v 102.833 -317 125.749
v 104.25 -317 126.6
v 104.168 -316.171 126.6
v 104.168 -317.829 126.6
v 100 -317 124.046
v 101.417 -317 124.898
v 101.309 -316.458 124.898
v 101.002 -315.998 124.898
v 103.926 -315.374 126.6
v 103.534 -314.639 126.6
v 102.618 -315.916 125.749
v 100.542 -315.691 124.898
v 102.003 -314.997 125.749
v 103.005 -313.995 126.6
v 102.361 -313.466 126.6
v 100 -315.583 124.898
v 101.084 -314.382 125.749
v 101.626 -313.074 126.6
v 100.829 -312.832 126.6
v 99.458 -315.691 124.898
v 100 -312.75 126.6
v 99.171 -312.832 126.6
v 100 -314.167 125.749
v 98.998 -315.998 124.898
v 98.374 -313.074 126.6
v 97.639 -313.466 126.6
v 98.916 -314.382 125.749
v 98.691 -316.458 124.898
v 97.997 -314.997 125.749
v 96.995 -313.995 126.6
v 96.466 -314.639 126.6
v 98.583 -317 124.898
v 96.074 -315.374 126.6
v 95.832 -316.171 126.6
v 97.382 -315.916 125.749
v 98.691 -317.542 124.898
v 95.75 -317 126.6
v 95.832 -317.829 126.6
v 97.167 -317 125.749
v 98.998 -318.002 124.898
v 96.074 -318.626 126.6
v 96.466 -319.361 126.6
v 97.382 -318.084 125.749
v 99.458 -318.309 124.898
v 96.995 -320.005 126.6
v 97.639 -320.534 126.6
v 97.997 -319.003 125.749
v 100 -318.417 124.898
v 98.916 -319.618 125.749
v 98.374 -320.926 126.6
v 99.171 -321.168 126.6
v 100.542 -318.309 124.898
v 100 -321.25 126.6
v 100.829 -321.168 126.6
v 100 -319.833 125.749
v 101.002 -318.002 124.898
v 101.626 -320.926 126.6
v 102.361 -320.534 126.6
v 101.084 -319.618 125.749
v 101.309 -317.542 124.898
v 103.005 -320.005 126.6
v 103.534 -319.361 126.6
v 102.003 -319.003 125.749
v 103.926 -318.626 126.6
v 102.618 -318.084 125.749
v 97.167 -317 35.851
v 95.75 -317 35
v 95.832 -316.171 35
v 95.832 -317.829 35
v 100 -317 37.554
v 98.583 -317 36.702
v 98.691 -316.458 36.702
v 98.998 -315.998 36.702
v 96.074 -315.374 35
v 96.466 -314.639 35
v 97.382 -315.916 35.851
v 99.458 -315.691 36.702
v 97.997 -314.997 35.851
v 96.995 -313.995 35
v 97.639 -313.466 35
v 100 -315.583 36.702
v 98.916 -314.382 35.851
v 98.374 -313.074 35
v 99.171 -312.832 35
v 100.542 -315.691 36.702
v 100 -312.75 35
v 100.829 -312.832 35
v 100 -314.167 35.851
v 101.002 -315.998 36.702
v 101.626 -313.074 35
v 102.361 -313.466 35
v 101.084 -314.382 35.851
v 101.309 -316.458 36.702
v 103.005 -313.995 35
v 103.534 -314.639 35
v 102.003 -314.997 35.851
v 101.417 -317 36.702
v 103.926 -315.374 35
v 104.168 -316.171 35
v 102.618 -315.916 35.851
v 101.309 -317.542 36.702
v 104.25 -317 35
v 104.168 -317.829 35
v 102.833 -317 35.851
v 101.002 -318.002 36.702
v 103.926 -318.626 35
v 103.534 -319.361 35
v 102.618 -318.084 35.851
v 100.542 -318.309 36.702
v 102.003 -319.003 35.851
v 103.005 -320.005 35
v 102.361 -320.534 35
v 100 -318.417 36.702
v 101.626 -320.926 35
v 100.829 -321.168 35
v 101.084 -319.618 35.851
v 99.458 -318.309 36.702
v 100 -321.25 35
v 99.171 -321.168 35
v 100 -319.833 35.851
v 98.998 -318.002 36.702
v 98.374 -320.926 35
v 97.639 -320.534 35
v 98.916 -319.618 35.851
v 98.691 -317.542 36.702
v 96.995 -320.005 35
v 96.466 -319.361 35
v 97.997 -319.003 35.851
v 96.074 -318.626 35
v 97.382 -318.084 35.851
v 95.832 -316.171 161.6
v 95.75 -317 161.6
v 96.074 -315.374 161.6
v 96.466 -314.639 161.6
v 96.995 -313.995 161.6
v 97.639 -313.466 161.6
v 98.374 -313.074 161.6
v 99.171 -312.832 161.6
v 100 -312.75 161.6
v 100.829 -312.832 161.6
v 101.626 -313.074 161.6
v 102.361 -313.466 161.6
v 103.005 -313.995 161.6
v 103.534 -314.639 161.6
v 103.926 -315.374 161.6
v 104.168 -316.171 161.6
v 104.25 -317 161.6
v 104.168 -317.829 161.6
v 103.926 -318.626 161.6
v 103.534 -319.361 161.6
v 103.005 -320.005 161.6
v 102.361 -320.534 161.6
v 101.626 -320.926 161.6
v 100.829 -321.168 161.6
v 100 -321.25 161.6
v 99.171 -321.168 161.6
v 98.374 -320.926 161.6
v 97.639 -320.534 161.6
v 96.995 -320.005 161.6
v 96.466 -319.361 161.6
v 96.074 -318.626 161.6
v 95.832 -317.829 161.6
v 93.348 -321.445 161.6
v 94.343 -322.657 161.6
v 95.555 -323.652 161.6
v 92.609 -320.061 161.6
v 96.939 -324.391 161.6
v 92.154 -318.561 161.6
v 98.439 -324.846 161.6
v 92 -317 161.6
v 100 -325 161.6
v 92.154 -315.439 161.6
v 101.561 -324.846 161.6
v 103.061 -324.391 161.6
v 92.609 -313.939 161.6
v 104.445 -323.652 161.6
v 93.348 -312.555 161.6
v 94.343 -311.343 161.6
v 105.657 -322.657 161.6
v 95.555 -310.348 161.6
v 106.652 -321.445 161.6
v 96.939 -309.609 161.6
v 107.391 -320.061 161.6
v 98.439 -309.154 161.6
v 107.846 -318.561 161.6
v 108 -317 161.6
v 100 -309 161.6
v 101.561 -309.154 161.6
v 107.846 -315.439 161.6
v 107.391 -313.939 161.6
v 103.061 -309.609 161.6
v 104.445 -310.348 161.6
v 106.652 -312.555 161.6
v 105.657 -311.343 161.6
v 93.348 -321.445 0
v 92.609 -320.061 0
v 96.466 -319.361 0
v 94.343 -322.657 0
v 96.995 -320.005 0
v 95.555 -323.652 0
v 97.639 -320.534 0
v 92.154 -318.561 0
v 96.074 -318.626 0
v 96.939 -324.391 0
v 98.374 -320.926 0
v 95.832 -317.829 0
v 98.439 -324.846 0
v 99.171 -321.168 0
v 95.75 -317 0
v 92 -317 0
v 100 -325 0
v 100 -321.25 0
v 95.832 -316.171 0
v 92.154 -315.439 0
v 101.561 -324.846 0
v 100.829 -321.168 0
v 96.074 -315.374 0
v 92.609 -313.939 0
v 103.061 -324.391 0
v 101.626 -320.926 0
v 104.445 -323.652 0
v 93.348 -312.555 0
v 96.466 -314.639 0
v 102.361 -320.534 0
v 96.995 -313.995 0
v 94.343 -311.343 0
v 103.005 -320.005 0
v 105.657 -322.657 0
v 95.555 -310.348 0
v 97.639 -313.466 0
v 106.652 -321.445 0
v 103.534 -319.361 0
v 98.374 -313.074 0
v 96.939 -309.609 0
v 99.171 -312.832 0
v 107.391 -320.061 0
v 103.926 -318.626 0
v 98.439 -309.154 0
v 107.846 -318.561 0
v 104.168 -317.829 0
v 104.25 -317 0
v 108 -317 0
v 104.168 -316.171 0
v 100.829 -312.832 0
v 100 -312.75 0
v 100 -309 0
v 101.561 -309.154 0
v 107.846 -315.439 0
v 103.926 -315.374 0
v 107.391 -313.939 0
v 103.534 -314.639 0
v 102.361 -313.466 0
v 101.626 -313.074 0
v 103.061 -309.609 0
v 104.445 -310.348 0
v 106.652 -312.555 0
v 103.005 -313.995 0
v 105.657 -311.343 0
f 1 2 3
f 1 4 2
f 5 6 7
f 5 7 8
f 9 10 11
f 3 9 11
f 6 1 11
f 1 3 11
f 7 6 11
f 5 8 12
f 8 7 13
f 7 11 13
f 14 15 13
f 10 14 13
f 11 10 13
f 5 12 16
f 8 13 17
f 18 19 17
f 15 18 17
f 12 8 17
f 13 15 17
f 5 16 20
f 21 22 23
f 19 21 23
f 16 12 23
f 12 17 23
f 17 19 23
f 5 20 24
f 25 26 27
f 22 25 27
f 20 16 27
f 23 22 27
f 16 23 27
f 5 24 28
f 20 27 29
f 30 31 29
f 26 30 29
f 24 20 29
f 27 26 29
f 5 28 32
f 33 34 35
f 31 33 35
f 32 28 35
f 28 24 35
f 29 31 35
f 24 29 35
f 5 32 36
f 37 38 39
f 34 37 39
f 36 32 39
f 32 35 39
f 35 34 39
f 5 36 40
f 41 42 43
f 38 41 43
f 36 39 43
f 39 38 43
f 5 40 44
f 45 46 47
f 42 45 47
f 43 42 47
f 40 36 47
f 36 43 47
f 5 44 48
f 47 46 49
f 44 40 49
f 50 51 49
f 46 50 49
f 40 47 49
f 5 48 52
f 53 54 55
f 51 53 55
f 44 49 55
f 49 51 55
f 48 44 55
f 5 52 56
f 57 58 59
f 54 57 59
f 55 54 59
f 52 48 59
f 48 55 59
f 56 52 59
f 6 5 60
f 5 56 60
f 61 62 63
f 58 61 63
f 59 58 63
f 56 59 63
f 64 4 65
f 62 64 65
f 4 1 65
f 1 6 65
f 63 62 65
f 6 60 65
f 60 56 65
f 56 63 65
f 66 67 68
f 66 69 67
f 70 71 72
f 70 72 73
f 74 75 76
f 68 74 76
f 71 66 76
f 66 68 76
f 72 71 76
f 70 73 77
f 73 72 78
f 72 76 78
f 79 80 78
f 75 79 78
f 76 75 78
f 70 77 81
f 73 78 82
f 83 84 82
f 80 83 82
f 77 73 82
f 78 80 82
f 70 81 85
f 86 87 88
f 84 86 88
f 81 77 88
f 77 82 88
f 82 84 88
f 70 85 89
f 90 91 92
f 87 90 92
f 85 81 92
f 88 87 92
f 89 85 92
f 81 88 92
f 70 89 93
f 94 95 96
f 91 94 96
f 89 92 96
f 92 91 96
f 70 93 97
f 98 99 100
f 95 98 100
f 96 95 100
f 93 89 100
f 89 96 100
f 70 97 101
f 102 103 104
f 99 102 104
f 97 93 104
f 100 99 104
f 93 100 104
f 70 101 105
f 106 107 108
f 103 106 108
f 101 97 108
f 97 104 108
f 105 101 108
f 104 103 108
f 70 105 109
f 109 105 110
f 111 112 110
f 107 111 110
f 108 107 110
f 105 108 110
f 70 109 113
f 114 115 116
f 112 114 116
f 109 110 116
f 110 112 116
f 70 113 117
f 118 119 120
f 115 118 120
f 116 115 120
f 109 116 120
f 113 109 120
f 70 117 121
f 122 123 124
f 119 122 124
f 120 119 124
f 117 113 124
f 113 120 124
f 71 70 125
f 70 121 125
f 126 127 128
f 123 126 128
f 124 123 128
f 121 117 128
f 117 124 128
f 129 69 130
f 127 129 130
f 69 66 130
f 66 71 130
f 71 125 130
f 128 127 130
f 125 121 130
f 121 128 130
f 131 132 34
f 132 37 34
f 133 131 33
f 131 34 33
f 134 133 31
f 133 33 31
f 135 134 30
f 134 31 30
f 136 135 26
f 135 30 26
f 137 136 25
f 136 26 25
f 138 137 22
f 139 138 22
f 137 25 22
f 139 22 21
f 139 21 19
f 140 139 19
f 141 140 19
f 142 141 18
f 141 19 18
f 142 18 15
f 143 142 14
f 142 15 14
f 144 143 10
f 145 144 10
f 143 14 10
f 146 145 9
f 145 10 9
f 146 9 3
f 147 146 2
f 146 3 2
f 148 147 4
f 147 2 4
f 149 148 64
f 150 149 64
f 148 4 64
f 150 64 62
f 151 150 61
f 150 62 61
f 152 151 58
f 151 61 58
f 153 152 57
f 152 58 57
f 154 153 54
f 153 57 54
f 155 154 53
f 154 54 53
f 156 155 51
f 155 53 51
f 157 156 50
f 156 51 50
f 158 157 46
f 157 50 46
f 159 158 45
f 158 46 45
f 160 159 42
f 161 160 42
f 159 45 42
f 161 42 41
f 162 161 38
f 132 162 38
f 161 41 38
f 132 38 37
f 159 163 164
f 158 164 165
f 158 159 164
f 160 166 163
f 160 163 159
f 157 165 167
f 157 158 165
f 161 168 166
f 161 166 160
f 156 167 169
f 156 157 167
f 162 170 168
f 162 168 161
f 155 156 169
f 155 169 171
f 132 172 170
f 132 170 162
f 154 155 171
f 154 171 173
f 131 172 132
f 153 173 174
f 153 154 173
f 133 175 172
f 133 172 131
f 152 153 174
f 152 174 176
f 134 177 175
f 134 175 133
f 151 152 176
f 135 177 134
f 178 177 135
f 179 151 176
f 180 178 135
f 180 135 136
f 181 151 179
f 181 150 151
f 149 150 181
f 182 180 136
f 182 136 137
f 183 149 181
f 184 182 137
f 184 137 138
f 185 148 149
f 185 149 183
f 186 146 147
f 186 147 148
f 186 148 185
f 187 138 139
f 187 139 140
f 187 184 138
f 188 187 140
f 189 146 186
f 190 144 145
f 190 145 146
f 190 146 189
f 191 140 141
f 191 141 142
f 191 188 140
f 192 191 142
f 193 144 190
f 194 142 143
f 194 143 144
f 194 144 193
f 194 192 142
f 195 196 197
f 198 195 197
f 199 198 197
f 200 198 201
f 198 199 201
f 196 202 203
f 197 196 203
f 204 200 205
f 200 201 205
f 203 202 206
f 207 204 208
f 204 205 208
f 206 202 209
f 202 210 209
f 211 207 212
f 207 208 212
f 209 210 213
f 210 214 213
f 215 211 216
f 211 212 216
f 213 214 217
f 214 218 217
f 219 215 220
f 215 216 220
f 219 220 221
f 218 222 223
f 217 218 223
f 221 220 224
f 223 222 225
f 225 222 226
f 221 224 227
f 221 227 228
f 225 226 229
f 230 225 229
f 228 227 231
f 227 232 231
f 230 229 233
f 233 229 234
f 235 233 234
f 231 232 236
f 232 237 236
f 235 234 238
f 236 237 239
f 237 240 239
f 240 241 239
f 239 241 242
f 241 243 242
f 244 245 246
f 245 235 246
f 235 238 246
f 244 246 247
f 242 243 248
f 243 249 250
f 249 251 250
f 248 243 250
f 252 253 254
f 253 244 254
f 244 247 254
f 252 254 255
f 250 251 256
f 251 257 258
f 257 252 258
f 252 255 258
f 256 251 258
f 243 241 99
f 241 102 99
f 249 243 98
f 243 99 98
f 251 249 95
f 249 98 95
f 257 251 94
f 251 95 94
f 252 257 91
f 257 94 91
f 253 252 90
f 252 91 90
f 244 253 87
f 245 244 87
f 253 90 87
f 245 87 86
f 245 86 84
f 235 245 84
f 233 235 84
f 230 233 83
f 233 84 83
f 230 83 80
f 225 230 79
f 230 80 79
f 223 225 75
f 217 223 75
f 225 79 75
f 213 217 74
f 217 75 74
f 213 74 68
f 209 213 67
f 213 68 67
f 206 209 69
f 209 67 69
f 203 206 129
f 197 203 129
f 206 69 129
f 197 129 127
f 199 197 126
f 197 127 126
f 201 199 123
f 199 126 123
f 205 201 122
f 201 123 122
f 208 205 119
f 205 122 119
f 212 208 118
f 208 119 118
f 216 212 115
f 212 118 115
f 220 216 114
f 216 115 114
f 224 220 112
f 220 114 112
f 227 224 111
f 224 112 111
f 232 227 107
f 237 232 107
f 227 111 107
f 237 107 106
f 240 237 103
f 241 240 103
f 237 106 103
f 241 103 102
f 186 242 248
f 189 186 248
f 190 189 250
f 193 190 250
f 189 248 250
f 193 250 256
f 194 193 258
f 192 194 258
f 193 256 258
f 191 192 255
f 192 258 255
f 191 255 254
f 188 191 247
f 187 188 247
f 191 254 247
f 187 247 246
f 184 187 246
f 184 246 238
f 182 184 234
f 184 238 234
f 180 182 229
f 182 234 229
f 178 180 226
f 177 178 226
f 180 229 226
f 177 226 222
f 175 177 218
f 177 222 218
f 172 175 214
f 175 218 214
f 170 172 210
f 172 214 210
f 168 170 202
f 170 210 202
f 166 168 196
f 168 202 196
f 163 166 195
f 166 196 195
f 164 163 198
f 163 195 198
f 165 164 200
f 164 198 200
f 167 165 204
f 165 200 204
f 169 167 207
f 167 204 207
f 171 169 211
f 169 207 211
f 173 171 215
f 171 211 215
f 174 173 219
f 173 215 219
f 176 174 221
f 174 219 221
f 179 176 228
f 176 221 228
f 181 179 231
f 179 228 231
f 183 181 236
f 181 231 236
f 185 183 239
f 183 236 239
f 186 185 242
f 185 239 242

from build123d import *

# Parameters (mm, degrees)
SKETCH_1_R             = 8
EXTRUDE_1_DEPTH        = 161.6
HOLE_WIZARD_M103_D     = 8.5
HOLE_WIZARD_M103_DEPTH = 35
HOLE_WIZARD_M103_TIP   = 2.553657631
HOLE_WIZARD_M104_D     = 8.5
HOLE_WIZARD_M104_DEPTH = 35
HOLE_WIZARD_M104_TIP   = 2.553657631


with BuildPart() as part:
    # Эскиз1 → Бобышка-Вытянуть1 (new body)
    with BuildSketch(Plane.XY):
        with Locations((100, -317)):
            Circle(SKETCH_1_R)
    extrude(amount=EXTRUDE_1_DEPTH)

    # Отверстие обработанное метчиком M103
    with Locations(Plane.XY.offset(161.6)):
        with Locations((100, -317)):
            Hole(HOLE_WIZARD_M103_D / 2, depth=HOLE_WIZARD_M103_DEPTH)
            with Locations((0, 0, -(HOLE_WIZARD_M103_DEPTH + HOLE_WIZARD_M103_TIP / 2))):  # 118° drill point
                Cone(0, HOLE_WIZARD_M103_D / 2, HOLE_WIZARD_M103_TIP, mode=Mode.SUBTRACT)

    # Отверстие обработанное метчиком M104
    with Locations(Plane(origin=(0, 0, 0), x_dir=(-1, 0, 0), z_dir=(0, 0, -1))):
        with Locations((-100, -317)):
            Hole(HOLE_WIZARD_M104_D / 2, depth=HOLE_WIZARD_M104_DEPTH)
            with Locations((0, 0, -(HOLE_WIZARD_M104_DEPTH + HOLE_WIZARD_M104_TIP / 2))):  # 118° drill point
                Cone(0, HOLE_WIZARD_M104_D / 2, HOLE_WIZARD_M104_TIP, mode=Mode.SUBTRACT)


solid = part.part
